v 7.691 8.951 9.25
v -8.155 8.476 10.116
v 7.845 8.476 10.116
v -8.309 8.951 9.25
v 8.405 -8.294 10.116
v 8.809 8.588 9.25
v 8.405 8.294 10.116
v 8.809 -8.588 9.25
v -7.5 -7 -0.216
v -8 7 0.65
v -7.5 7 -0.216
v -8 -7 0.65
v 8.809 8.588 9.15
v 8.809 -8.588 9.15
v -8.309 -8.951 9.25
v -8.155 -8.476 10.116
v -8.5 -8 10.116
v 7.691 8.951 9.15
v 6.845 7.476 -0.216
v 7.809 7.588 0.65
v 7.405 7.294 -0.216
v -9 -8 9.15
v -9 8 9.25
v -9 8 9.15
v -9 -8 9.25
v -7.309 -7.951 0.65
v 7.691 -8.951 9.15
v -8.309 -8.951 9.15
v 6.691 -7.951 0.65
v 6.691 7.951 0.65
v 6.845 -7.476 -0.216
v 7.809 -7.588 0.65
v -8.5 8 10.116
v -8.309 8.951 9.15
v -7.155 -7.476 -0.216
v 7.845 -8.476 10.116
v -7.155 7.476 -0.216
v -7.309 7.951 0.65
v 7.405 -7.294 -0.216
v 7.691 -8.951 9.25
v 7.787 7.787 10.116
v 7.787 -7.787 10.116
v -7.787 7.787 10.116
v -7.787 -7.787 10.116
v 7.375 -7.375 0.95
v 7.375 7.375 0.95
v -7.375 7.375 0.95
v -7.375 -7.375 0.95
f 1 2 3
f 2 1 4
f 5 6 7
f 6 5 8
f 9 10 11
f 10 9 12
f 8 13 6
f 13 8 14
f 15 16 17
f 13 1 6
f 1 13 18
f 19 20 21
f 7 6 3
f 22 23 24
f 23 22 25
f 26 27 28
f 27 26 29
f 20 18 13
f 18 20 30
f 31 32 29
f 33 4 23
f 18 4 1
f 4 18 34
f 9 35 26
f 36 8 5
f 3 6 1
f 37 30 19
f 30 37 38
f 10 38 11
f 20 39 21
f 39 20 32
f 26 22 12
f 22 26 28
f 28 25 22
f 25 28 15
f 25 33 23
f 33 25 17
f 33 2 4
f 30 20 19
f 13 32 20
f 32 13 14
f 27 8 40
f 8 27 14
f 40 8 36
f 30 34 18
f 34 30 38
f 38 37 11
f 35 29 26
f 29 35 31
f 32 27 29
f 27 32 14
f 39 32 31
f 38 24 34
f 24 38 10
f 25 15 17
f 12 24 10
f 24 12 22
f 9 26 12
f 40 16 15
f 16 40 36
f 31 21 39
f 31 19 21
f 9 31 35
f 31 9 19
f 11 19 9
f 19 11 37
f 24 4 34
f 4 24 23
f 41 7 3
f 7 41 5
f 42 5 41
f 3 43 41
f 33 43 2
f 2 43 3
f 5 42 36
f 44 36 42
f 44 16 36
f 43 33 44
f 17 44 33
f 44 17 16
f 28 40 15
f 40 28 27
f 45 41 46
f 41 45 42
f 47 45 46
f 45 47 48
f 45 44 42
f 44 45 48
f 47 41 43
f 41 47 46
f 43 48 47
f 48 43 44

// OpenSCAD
// More information: https://danielupshaw.com/openscad-rounded-corners/

module roundedcube_simple(size = [1, 1, 1], center = false, radius = 0.5) {
	// If single value, convert to [x, y, z] vector
	size = (size[0] == undef) ? [size, size, size] : size;

	translate = (center == false) ?
		[radius, radius, radius] :
		[
			radius - (size[0] / 2),
			radius - (size[1] / 2),
			radius - (size[2] / 2)
	];

	translate(v = translate)
	minkowski() {
		cube(size = [
			size[0] - (radius * 2),
			size[1] - (radius * 2),
			size[2] - (radius * 2)
		]);
		sphere(r = radius);
	}
}

module roundedcube_tapered(size = [1, 1, 1], center = false, radius = 0.5) {
	// If single value, convert to [x, y, z] vector
	size = (size[0] == undef) ? [size, size, size] : size;

	translate = (center == false) ?
		[radius, radius, radius] :
		[
			radius - (size[0] / 2),
			radius - (size[1] / 2),
			radius - (size[2] / 2)
	];

	translate(v = translate)

    hull() {

        minkowski() {
            cube(size = [
                size[0] - (radius * 2),
                size[1] - (radius * 2),
                0.1 //size[2] - (radius * 2)
            ]);
            sphere(r = radius);
        }

        translate([+1, +1, size[2]]) {
            minkowski() {
                cube(size = [
                    size[0] - 2 - (radius * 2),
                    size[1] - 2 - (radius * 2),
                    0.1 //size[2] - 2 - (radius * 2)
                ]);
                sphere(r = radius);
            }
        }
    }
}


// Module: Create tapering cube
module tapered_cube(bottom_size, top_size, height) {
    hull() {
        // Bottom cube
        cube(bottom_size, center = true);

        // Top cube (translated up)
        translate([0, 0, height]) {
            cube(top_size, center = true);
        }
    }
}
    
//translate(v = [2.5, -0.5, 5])
//translate(v = [0, 0, 0])
//color("Yellow")
//roundedcube_simple([14, 14, 7], false, 0.5);

rotate([0, 180, 0])
translate([0, 0, -6])
difference() {

    color("Yellow")
        translate(v = [0, 0, 0])
        roundedcube_tapered([18, 18, 8.5], true, 1);

    // Create a tapering cube hole on inside
    color("red")
        translate([0, 0, -5])
        tapered_cube(bottom_size = [15.65, 15.65, 0.1], top_size = [14.75, 14.75, 0.1], height = 10);
}
